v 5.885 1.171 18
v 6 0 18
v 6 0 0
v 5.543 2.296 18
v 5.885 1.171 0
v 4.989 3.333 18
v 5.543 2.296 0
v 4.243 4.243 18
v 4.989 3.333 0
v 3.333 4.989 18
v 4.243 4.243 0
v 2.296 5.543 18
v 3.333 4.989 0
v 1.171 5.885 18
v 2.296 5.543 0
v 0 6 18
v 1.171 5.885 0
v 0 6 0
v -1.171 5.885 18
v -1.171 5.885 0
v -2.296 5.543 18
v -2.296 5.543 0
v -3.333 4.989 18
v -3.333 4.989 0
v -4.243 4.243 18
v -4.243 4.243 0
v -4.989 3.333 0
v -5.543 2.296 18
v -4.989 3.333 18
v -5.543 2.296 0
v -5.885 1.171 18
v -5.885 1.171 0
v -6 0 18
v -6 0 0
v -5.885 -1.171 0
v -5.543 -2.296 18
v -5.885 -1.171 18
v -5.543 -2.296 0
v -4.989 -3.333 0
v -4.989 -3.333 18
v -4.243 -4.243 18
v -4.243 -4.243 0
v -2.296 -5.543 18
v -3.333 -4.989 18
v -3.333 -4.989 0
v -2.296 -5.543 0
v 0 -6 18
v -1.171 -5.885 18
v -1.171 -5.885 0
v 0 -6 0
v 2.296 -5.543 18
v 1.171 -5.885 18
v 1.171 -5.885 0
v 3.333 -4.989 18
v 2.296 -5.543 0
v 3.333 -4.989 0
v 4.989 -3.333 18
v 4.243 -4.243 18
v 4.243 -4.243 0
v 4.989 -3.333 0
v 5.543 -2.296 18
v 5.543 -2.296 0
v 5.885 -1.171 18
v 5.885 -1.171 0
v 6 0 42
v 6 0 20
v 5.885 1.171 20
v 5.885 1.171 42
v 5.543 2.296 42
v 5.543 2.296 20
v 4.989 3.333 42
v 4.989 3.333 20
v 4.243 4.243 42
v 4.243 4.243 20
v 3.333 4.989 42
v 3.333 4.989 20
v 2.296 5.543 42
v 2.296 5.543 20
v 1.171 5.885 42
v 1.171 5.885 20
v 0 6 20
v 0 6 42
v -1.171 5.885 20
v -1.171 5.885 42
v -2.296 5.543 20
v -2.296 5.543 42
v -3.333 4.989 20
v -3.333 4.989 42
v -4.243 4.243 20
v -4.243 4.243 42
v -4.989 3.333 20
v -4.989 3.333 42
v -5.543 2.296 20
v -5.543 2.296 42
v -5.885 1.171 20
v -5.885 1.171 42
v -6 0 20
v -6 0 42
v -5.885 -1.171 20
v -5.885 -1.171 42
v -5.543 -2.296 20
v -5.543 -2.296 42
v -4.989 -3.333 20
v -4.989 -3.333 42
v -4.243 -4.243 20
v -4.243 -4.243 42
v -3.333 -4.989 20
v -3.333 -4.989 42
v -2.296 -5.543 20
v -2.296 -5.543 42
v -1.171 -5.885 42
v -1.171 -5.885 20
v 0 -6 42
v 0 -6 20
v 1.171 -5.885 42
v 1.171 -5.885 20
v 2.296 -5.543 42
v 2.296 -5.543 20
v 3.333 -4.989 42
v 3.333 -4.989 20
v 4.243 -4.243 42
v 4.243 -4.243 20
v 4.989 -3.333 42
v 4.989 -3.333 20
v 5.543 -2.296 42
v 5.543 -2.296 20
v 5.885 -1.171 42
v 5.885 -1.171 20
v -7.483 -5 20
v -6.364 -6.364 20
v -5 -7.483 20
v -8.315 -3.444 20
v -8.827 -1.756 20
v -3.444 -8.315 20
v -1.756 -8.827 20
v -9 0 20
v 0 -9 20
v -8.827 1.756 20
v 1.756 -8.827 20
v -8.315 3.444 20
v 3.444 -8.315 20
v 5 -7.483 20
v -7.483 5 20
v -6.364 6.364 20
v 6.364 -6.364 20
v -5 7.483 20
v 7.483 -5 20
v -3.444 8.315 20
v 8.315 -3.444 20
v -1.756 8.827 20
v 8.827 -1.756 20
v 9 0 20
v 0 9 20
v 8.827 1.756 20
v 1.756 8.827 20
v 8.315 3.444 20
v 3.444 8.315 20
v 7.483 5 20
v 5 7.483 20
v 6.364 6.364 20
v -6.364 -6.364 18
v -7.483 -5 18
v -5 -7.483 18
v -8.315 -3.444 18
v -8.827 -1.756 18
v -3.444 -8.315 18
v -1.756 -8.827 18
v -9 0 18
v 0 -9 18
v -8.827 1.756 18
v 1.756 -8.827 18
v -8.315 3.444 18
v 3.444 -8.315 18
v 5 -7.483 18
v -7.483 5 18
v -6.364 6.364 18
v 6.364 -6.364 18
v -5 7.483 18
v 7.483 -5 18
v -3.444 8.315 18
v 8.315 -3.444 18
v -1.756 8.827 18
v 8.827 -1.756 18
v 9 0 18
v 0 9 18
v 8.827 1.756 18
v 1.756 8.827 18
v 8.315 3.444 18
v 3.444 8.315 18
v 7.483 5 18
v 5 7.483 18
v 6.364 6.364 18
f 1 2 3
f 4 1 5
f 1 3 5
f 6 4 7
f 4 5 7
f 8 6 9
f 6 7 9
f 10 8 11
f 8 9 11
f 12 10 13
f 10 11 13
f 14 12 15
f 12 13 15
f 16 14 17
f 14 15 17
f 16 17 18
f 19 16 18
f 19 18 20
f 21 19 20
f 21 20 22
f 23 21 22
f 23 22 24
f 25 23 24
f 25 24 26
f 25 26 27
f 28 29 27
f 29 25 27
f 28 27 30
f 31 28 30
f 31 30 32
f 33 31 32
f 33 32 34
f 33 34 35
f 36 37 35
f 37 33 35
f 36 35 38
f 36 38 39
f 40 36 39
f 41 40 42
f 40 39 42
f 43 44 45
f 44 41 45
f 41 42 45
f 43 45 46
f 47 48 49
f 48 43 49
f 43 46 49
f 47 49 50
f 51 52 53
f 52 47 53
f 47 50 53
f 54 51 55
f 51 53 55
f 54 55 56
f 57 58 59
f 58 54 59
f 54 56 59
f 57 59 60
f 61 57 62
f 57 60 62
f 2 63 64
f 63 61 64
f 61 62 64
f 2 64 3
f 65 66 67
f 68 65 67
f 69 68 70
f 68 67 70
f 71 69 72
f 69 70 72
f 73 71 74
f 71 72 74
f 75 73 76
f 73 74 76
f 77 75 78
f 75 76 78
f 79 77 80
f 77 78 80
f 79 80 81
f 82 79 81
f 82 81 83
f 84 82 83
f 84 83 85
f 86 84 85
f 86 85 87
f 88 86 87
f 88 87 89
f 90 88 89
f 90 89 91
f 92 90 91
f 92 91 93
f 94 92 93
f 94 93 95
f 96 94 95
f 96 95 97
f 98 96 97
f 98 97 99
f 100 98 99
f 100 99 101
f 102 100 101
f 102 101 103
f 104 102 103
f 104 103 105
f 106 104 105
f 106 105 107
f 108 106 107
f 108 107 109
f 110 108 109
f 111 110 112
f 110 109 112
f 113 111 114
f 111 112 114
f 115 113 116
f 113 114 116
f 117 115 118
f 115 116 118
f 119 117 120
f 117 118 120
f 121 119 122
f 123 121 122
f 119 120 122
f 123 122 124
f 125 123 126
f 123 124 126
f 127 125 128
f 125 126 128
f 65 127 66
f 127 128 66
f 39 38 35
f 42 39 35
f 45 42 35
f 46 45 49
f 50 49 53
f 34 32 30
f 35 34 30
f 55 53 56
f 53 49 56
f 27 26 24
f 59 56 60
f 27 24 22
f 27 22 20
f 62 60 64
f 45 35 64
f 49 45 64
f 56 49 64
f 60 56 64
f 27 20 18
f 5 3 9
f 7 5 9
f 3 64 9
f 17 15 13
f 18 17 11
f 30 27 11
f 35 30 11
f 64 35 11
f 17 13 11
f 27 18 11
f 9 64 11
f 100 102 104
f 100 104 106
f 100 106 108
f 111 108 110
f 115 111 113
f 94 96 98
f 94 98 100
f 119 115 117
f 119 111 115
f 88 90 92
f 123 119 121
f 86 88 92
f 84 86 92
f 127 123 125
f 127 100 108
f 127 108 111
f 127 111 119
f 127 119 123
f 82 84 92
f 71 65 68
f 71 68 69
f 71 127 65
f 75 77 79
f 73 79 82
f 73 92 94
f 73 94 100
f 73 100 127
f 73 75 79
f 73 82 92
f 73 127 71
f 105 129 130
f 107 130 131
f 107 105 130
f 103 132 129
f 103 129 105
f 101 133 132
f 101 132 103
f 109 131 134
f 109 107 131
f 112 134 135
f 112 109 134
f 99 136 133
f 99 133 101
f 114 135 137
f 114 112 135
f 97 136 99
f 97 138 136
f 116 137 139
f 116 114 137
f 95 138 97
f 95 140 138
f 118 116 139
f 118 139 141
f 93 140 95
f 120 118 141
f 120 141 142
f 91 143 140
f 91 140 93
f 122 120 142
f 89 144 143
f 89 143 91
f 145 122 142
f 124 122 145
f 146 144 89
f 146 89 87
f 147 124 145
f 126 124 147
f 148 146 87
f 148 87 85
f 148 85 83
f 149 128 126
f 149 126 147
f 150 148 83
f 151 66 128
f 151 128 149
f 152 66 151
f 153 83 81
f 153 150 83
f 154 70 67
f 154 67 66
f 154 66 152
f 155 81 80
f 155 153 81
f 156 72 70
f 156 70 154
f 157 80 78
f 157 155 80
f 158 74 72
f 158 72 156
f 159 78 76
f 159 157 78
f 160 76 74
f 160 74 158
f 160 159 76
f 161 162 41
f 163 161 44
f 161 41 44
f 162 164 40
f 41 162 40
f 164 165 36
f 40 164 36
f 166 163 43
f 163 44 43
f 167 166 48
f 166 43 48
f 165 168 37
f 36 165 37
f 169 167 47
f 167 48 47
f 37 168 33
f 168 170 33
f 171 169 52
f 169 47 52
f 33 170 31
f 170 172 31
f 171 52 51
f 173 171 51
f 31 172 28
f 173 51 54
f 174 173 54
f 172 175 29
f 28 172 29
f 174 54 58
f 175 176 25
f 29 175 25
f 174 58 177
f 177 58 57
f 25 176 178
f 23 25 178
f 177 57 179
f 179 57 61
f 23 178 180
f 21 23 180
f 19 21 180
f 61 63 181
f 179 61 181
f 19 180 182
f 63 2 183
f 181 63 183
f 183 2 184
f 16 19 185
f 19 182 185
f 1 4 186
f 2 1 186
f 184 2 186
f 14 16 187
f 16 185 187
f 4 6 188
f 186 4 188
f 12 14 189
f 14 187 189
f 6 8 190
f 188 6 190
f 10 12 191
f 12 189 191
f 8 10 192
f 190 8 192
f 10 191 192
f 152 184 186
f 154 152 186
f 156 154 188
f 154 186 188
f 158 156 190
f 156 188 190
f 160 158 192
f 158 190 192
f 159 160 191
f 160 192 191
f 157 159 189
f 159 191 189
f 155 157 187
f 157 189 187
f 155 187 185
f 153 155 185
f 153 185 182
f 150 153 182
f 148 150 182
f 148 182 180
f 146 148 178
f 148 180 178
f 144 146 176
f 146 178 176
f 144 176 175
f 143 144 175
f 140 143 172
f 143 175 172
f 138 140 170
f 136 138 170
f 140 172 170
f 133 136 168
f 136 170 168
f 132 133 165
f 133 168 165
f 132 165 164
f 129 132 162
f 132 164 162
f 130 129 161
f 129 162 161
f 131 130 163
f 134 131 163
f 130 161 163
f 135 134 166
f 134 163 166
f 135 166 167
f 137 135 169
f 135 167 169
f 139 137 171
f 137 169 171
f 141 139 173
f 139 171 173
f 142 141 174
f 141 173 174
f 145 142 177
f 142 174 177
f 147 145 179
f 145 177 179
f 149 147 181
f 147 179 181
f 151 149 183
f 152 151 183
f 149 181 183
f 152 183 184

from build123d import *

# Parameters (mm, degrees)
SKETCH1_R           = 6
BOSS_EXTRUDE1_DEPTH = 42
BOSS_EXTRUDE2_START = -24
SKETCH2_R           = 9
BOSS_EXTRUDE2_DEPTH = 2


with BuildPart() as part:
    # Sketch1 → Boss-Extrude1 (new body)
    with BuildSketch(Plane.XY):
        Circle(SKETCH1_R)
    extrude(amount=BOSS_EXTRUDE1_DEPTH)

    # Sketch2 → Boss-Extrude2 (add)
    with BuildSketch(Plane.XY.offset(42).offset(BOSS_EXTRUDE2_START)):
        Circle(SKETCH2_R)
    extrude(amount=BOSS_EXTRUDE2_DEPTH)


solid = part.part
